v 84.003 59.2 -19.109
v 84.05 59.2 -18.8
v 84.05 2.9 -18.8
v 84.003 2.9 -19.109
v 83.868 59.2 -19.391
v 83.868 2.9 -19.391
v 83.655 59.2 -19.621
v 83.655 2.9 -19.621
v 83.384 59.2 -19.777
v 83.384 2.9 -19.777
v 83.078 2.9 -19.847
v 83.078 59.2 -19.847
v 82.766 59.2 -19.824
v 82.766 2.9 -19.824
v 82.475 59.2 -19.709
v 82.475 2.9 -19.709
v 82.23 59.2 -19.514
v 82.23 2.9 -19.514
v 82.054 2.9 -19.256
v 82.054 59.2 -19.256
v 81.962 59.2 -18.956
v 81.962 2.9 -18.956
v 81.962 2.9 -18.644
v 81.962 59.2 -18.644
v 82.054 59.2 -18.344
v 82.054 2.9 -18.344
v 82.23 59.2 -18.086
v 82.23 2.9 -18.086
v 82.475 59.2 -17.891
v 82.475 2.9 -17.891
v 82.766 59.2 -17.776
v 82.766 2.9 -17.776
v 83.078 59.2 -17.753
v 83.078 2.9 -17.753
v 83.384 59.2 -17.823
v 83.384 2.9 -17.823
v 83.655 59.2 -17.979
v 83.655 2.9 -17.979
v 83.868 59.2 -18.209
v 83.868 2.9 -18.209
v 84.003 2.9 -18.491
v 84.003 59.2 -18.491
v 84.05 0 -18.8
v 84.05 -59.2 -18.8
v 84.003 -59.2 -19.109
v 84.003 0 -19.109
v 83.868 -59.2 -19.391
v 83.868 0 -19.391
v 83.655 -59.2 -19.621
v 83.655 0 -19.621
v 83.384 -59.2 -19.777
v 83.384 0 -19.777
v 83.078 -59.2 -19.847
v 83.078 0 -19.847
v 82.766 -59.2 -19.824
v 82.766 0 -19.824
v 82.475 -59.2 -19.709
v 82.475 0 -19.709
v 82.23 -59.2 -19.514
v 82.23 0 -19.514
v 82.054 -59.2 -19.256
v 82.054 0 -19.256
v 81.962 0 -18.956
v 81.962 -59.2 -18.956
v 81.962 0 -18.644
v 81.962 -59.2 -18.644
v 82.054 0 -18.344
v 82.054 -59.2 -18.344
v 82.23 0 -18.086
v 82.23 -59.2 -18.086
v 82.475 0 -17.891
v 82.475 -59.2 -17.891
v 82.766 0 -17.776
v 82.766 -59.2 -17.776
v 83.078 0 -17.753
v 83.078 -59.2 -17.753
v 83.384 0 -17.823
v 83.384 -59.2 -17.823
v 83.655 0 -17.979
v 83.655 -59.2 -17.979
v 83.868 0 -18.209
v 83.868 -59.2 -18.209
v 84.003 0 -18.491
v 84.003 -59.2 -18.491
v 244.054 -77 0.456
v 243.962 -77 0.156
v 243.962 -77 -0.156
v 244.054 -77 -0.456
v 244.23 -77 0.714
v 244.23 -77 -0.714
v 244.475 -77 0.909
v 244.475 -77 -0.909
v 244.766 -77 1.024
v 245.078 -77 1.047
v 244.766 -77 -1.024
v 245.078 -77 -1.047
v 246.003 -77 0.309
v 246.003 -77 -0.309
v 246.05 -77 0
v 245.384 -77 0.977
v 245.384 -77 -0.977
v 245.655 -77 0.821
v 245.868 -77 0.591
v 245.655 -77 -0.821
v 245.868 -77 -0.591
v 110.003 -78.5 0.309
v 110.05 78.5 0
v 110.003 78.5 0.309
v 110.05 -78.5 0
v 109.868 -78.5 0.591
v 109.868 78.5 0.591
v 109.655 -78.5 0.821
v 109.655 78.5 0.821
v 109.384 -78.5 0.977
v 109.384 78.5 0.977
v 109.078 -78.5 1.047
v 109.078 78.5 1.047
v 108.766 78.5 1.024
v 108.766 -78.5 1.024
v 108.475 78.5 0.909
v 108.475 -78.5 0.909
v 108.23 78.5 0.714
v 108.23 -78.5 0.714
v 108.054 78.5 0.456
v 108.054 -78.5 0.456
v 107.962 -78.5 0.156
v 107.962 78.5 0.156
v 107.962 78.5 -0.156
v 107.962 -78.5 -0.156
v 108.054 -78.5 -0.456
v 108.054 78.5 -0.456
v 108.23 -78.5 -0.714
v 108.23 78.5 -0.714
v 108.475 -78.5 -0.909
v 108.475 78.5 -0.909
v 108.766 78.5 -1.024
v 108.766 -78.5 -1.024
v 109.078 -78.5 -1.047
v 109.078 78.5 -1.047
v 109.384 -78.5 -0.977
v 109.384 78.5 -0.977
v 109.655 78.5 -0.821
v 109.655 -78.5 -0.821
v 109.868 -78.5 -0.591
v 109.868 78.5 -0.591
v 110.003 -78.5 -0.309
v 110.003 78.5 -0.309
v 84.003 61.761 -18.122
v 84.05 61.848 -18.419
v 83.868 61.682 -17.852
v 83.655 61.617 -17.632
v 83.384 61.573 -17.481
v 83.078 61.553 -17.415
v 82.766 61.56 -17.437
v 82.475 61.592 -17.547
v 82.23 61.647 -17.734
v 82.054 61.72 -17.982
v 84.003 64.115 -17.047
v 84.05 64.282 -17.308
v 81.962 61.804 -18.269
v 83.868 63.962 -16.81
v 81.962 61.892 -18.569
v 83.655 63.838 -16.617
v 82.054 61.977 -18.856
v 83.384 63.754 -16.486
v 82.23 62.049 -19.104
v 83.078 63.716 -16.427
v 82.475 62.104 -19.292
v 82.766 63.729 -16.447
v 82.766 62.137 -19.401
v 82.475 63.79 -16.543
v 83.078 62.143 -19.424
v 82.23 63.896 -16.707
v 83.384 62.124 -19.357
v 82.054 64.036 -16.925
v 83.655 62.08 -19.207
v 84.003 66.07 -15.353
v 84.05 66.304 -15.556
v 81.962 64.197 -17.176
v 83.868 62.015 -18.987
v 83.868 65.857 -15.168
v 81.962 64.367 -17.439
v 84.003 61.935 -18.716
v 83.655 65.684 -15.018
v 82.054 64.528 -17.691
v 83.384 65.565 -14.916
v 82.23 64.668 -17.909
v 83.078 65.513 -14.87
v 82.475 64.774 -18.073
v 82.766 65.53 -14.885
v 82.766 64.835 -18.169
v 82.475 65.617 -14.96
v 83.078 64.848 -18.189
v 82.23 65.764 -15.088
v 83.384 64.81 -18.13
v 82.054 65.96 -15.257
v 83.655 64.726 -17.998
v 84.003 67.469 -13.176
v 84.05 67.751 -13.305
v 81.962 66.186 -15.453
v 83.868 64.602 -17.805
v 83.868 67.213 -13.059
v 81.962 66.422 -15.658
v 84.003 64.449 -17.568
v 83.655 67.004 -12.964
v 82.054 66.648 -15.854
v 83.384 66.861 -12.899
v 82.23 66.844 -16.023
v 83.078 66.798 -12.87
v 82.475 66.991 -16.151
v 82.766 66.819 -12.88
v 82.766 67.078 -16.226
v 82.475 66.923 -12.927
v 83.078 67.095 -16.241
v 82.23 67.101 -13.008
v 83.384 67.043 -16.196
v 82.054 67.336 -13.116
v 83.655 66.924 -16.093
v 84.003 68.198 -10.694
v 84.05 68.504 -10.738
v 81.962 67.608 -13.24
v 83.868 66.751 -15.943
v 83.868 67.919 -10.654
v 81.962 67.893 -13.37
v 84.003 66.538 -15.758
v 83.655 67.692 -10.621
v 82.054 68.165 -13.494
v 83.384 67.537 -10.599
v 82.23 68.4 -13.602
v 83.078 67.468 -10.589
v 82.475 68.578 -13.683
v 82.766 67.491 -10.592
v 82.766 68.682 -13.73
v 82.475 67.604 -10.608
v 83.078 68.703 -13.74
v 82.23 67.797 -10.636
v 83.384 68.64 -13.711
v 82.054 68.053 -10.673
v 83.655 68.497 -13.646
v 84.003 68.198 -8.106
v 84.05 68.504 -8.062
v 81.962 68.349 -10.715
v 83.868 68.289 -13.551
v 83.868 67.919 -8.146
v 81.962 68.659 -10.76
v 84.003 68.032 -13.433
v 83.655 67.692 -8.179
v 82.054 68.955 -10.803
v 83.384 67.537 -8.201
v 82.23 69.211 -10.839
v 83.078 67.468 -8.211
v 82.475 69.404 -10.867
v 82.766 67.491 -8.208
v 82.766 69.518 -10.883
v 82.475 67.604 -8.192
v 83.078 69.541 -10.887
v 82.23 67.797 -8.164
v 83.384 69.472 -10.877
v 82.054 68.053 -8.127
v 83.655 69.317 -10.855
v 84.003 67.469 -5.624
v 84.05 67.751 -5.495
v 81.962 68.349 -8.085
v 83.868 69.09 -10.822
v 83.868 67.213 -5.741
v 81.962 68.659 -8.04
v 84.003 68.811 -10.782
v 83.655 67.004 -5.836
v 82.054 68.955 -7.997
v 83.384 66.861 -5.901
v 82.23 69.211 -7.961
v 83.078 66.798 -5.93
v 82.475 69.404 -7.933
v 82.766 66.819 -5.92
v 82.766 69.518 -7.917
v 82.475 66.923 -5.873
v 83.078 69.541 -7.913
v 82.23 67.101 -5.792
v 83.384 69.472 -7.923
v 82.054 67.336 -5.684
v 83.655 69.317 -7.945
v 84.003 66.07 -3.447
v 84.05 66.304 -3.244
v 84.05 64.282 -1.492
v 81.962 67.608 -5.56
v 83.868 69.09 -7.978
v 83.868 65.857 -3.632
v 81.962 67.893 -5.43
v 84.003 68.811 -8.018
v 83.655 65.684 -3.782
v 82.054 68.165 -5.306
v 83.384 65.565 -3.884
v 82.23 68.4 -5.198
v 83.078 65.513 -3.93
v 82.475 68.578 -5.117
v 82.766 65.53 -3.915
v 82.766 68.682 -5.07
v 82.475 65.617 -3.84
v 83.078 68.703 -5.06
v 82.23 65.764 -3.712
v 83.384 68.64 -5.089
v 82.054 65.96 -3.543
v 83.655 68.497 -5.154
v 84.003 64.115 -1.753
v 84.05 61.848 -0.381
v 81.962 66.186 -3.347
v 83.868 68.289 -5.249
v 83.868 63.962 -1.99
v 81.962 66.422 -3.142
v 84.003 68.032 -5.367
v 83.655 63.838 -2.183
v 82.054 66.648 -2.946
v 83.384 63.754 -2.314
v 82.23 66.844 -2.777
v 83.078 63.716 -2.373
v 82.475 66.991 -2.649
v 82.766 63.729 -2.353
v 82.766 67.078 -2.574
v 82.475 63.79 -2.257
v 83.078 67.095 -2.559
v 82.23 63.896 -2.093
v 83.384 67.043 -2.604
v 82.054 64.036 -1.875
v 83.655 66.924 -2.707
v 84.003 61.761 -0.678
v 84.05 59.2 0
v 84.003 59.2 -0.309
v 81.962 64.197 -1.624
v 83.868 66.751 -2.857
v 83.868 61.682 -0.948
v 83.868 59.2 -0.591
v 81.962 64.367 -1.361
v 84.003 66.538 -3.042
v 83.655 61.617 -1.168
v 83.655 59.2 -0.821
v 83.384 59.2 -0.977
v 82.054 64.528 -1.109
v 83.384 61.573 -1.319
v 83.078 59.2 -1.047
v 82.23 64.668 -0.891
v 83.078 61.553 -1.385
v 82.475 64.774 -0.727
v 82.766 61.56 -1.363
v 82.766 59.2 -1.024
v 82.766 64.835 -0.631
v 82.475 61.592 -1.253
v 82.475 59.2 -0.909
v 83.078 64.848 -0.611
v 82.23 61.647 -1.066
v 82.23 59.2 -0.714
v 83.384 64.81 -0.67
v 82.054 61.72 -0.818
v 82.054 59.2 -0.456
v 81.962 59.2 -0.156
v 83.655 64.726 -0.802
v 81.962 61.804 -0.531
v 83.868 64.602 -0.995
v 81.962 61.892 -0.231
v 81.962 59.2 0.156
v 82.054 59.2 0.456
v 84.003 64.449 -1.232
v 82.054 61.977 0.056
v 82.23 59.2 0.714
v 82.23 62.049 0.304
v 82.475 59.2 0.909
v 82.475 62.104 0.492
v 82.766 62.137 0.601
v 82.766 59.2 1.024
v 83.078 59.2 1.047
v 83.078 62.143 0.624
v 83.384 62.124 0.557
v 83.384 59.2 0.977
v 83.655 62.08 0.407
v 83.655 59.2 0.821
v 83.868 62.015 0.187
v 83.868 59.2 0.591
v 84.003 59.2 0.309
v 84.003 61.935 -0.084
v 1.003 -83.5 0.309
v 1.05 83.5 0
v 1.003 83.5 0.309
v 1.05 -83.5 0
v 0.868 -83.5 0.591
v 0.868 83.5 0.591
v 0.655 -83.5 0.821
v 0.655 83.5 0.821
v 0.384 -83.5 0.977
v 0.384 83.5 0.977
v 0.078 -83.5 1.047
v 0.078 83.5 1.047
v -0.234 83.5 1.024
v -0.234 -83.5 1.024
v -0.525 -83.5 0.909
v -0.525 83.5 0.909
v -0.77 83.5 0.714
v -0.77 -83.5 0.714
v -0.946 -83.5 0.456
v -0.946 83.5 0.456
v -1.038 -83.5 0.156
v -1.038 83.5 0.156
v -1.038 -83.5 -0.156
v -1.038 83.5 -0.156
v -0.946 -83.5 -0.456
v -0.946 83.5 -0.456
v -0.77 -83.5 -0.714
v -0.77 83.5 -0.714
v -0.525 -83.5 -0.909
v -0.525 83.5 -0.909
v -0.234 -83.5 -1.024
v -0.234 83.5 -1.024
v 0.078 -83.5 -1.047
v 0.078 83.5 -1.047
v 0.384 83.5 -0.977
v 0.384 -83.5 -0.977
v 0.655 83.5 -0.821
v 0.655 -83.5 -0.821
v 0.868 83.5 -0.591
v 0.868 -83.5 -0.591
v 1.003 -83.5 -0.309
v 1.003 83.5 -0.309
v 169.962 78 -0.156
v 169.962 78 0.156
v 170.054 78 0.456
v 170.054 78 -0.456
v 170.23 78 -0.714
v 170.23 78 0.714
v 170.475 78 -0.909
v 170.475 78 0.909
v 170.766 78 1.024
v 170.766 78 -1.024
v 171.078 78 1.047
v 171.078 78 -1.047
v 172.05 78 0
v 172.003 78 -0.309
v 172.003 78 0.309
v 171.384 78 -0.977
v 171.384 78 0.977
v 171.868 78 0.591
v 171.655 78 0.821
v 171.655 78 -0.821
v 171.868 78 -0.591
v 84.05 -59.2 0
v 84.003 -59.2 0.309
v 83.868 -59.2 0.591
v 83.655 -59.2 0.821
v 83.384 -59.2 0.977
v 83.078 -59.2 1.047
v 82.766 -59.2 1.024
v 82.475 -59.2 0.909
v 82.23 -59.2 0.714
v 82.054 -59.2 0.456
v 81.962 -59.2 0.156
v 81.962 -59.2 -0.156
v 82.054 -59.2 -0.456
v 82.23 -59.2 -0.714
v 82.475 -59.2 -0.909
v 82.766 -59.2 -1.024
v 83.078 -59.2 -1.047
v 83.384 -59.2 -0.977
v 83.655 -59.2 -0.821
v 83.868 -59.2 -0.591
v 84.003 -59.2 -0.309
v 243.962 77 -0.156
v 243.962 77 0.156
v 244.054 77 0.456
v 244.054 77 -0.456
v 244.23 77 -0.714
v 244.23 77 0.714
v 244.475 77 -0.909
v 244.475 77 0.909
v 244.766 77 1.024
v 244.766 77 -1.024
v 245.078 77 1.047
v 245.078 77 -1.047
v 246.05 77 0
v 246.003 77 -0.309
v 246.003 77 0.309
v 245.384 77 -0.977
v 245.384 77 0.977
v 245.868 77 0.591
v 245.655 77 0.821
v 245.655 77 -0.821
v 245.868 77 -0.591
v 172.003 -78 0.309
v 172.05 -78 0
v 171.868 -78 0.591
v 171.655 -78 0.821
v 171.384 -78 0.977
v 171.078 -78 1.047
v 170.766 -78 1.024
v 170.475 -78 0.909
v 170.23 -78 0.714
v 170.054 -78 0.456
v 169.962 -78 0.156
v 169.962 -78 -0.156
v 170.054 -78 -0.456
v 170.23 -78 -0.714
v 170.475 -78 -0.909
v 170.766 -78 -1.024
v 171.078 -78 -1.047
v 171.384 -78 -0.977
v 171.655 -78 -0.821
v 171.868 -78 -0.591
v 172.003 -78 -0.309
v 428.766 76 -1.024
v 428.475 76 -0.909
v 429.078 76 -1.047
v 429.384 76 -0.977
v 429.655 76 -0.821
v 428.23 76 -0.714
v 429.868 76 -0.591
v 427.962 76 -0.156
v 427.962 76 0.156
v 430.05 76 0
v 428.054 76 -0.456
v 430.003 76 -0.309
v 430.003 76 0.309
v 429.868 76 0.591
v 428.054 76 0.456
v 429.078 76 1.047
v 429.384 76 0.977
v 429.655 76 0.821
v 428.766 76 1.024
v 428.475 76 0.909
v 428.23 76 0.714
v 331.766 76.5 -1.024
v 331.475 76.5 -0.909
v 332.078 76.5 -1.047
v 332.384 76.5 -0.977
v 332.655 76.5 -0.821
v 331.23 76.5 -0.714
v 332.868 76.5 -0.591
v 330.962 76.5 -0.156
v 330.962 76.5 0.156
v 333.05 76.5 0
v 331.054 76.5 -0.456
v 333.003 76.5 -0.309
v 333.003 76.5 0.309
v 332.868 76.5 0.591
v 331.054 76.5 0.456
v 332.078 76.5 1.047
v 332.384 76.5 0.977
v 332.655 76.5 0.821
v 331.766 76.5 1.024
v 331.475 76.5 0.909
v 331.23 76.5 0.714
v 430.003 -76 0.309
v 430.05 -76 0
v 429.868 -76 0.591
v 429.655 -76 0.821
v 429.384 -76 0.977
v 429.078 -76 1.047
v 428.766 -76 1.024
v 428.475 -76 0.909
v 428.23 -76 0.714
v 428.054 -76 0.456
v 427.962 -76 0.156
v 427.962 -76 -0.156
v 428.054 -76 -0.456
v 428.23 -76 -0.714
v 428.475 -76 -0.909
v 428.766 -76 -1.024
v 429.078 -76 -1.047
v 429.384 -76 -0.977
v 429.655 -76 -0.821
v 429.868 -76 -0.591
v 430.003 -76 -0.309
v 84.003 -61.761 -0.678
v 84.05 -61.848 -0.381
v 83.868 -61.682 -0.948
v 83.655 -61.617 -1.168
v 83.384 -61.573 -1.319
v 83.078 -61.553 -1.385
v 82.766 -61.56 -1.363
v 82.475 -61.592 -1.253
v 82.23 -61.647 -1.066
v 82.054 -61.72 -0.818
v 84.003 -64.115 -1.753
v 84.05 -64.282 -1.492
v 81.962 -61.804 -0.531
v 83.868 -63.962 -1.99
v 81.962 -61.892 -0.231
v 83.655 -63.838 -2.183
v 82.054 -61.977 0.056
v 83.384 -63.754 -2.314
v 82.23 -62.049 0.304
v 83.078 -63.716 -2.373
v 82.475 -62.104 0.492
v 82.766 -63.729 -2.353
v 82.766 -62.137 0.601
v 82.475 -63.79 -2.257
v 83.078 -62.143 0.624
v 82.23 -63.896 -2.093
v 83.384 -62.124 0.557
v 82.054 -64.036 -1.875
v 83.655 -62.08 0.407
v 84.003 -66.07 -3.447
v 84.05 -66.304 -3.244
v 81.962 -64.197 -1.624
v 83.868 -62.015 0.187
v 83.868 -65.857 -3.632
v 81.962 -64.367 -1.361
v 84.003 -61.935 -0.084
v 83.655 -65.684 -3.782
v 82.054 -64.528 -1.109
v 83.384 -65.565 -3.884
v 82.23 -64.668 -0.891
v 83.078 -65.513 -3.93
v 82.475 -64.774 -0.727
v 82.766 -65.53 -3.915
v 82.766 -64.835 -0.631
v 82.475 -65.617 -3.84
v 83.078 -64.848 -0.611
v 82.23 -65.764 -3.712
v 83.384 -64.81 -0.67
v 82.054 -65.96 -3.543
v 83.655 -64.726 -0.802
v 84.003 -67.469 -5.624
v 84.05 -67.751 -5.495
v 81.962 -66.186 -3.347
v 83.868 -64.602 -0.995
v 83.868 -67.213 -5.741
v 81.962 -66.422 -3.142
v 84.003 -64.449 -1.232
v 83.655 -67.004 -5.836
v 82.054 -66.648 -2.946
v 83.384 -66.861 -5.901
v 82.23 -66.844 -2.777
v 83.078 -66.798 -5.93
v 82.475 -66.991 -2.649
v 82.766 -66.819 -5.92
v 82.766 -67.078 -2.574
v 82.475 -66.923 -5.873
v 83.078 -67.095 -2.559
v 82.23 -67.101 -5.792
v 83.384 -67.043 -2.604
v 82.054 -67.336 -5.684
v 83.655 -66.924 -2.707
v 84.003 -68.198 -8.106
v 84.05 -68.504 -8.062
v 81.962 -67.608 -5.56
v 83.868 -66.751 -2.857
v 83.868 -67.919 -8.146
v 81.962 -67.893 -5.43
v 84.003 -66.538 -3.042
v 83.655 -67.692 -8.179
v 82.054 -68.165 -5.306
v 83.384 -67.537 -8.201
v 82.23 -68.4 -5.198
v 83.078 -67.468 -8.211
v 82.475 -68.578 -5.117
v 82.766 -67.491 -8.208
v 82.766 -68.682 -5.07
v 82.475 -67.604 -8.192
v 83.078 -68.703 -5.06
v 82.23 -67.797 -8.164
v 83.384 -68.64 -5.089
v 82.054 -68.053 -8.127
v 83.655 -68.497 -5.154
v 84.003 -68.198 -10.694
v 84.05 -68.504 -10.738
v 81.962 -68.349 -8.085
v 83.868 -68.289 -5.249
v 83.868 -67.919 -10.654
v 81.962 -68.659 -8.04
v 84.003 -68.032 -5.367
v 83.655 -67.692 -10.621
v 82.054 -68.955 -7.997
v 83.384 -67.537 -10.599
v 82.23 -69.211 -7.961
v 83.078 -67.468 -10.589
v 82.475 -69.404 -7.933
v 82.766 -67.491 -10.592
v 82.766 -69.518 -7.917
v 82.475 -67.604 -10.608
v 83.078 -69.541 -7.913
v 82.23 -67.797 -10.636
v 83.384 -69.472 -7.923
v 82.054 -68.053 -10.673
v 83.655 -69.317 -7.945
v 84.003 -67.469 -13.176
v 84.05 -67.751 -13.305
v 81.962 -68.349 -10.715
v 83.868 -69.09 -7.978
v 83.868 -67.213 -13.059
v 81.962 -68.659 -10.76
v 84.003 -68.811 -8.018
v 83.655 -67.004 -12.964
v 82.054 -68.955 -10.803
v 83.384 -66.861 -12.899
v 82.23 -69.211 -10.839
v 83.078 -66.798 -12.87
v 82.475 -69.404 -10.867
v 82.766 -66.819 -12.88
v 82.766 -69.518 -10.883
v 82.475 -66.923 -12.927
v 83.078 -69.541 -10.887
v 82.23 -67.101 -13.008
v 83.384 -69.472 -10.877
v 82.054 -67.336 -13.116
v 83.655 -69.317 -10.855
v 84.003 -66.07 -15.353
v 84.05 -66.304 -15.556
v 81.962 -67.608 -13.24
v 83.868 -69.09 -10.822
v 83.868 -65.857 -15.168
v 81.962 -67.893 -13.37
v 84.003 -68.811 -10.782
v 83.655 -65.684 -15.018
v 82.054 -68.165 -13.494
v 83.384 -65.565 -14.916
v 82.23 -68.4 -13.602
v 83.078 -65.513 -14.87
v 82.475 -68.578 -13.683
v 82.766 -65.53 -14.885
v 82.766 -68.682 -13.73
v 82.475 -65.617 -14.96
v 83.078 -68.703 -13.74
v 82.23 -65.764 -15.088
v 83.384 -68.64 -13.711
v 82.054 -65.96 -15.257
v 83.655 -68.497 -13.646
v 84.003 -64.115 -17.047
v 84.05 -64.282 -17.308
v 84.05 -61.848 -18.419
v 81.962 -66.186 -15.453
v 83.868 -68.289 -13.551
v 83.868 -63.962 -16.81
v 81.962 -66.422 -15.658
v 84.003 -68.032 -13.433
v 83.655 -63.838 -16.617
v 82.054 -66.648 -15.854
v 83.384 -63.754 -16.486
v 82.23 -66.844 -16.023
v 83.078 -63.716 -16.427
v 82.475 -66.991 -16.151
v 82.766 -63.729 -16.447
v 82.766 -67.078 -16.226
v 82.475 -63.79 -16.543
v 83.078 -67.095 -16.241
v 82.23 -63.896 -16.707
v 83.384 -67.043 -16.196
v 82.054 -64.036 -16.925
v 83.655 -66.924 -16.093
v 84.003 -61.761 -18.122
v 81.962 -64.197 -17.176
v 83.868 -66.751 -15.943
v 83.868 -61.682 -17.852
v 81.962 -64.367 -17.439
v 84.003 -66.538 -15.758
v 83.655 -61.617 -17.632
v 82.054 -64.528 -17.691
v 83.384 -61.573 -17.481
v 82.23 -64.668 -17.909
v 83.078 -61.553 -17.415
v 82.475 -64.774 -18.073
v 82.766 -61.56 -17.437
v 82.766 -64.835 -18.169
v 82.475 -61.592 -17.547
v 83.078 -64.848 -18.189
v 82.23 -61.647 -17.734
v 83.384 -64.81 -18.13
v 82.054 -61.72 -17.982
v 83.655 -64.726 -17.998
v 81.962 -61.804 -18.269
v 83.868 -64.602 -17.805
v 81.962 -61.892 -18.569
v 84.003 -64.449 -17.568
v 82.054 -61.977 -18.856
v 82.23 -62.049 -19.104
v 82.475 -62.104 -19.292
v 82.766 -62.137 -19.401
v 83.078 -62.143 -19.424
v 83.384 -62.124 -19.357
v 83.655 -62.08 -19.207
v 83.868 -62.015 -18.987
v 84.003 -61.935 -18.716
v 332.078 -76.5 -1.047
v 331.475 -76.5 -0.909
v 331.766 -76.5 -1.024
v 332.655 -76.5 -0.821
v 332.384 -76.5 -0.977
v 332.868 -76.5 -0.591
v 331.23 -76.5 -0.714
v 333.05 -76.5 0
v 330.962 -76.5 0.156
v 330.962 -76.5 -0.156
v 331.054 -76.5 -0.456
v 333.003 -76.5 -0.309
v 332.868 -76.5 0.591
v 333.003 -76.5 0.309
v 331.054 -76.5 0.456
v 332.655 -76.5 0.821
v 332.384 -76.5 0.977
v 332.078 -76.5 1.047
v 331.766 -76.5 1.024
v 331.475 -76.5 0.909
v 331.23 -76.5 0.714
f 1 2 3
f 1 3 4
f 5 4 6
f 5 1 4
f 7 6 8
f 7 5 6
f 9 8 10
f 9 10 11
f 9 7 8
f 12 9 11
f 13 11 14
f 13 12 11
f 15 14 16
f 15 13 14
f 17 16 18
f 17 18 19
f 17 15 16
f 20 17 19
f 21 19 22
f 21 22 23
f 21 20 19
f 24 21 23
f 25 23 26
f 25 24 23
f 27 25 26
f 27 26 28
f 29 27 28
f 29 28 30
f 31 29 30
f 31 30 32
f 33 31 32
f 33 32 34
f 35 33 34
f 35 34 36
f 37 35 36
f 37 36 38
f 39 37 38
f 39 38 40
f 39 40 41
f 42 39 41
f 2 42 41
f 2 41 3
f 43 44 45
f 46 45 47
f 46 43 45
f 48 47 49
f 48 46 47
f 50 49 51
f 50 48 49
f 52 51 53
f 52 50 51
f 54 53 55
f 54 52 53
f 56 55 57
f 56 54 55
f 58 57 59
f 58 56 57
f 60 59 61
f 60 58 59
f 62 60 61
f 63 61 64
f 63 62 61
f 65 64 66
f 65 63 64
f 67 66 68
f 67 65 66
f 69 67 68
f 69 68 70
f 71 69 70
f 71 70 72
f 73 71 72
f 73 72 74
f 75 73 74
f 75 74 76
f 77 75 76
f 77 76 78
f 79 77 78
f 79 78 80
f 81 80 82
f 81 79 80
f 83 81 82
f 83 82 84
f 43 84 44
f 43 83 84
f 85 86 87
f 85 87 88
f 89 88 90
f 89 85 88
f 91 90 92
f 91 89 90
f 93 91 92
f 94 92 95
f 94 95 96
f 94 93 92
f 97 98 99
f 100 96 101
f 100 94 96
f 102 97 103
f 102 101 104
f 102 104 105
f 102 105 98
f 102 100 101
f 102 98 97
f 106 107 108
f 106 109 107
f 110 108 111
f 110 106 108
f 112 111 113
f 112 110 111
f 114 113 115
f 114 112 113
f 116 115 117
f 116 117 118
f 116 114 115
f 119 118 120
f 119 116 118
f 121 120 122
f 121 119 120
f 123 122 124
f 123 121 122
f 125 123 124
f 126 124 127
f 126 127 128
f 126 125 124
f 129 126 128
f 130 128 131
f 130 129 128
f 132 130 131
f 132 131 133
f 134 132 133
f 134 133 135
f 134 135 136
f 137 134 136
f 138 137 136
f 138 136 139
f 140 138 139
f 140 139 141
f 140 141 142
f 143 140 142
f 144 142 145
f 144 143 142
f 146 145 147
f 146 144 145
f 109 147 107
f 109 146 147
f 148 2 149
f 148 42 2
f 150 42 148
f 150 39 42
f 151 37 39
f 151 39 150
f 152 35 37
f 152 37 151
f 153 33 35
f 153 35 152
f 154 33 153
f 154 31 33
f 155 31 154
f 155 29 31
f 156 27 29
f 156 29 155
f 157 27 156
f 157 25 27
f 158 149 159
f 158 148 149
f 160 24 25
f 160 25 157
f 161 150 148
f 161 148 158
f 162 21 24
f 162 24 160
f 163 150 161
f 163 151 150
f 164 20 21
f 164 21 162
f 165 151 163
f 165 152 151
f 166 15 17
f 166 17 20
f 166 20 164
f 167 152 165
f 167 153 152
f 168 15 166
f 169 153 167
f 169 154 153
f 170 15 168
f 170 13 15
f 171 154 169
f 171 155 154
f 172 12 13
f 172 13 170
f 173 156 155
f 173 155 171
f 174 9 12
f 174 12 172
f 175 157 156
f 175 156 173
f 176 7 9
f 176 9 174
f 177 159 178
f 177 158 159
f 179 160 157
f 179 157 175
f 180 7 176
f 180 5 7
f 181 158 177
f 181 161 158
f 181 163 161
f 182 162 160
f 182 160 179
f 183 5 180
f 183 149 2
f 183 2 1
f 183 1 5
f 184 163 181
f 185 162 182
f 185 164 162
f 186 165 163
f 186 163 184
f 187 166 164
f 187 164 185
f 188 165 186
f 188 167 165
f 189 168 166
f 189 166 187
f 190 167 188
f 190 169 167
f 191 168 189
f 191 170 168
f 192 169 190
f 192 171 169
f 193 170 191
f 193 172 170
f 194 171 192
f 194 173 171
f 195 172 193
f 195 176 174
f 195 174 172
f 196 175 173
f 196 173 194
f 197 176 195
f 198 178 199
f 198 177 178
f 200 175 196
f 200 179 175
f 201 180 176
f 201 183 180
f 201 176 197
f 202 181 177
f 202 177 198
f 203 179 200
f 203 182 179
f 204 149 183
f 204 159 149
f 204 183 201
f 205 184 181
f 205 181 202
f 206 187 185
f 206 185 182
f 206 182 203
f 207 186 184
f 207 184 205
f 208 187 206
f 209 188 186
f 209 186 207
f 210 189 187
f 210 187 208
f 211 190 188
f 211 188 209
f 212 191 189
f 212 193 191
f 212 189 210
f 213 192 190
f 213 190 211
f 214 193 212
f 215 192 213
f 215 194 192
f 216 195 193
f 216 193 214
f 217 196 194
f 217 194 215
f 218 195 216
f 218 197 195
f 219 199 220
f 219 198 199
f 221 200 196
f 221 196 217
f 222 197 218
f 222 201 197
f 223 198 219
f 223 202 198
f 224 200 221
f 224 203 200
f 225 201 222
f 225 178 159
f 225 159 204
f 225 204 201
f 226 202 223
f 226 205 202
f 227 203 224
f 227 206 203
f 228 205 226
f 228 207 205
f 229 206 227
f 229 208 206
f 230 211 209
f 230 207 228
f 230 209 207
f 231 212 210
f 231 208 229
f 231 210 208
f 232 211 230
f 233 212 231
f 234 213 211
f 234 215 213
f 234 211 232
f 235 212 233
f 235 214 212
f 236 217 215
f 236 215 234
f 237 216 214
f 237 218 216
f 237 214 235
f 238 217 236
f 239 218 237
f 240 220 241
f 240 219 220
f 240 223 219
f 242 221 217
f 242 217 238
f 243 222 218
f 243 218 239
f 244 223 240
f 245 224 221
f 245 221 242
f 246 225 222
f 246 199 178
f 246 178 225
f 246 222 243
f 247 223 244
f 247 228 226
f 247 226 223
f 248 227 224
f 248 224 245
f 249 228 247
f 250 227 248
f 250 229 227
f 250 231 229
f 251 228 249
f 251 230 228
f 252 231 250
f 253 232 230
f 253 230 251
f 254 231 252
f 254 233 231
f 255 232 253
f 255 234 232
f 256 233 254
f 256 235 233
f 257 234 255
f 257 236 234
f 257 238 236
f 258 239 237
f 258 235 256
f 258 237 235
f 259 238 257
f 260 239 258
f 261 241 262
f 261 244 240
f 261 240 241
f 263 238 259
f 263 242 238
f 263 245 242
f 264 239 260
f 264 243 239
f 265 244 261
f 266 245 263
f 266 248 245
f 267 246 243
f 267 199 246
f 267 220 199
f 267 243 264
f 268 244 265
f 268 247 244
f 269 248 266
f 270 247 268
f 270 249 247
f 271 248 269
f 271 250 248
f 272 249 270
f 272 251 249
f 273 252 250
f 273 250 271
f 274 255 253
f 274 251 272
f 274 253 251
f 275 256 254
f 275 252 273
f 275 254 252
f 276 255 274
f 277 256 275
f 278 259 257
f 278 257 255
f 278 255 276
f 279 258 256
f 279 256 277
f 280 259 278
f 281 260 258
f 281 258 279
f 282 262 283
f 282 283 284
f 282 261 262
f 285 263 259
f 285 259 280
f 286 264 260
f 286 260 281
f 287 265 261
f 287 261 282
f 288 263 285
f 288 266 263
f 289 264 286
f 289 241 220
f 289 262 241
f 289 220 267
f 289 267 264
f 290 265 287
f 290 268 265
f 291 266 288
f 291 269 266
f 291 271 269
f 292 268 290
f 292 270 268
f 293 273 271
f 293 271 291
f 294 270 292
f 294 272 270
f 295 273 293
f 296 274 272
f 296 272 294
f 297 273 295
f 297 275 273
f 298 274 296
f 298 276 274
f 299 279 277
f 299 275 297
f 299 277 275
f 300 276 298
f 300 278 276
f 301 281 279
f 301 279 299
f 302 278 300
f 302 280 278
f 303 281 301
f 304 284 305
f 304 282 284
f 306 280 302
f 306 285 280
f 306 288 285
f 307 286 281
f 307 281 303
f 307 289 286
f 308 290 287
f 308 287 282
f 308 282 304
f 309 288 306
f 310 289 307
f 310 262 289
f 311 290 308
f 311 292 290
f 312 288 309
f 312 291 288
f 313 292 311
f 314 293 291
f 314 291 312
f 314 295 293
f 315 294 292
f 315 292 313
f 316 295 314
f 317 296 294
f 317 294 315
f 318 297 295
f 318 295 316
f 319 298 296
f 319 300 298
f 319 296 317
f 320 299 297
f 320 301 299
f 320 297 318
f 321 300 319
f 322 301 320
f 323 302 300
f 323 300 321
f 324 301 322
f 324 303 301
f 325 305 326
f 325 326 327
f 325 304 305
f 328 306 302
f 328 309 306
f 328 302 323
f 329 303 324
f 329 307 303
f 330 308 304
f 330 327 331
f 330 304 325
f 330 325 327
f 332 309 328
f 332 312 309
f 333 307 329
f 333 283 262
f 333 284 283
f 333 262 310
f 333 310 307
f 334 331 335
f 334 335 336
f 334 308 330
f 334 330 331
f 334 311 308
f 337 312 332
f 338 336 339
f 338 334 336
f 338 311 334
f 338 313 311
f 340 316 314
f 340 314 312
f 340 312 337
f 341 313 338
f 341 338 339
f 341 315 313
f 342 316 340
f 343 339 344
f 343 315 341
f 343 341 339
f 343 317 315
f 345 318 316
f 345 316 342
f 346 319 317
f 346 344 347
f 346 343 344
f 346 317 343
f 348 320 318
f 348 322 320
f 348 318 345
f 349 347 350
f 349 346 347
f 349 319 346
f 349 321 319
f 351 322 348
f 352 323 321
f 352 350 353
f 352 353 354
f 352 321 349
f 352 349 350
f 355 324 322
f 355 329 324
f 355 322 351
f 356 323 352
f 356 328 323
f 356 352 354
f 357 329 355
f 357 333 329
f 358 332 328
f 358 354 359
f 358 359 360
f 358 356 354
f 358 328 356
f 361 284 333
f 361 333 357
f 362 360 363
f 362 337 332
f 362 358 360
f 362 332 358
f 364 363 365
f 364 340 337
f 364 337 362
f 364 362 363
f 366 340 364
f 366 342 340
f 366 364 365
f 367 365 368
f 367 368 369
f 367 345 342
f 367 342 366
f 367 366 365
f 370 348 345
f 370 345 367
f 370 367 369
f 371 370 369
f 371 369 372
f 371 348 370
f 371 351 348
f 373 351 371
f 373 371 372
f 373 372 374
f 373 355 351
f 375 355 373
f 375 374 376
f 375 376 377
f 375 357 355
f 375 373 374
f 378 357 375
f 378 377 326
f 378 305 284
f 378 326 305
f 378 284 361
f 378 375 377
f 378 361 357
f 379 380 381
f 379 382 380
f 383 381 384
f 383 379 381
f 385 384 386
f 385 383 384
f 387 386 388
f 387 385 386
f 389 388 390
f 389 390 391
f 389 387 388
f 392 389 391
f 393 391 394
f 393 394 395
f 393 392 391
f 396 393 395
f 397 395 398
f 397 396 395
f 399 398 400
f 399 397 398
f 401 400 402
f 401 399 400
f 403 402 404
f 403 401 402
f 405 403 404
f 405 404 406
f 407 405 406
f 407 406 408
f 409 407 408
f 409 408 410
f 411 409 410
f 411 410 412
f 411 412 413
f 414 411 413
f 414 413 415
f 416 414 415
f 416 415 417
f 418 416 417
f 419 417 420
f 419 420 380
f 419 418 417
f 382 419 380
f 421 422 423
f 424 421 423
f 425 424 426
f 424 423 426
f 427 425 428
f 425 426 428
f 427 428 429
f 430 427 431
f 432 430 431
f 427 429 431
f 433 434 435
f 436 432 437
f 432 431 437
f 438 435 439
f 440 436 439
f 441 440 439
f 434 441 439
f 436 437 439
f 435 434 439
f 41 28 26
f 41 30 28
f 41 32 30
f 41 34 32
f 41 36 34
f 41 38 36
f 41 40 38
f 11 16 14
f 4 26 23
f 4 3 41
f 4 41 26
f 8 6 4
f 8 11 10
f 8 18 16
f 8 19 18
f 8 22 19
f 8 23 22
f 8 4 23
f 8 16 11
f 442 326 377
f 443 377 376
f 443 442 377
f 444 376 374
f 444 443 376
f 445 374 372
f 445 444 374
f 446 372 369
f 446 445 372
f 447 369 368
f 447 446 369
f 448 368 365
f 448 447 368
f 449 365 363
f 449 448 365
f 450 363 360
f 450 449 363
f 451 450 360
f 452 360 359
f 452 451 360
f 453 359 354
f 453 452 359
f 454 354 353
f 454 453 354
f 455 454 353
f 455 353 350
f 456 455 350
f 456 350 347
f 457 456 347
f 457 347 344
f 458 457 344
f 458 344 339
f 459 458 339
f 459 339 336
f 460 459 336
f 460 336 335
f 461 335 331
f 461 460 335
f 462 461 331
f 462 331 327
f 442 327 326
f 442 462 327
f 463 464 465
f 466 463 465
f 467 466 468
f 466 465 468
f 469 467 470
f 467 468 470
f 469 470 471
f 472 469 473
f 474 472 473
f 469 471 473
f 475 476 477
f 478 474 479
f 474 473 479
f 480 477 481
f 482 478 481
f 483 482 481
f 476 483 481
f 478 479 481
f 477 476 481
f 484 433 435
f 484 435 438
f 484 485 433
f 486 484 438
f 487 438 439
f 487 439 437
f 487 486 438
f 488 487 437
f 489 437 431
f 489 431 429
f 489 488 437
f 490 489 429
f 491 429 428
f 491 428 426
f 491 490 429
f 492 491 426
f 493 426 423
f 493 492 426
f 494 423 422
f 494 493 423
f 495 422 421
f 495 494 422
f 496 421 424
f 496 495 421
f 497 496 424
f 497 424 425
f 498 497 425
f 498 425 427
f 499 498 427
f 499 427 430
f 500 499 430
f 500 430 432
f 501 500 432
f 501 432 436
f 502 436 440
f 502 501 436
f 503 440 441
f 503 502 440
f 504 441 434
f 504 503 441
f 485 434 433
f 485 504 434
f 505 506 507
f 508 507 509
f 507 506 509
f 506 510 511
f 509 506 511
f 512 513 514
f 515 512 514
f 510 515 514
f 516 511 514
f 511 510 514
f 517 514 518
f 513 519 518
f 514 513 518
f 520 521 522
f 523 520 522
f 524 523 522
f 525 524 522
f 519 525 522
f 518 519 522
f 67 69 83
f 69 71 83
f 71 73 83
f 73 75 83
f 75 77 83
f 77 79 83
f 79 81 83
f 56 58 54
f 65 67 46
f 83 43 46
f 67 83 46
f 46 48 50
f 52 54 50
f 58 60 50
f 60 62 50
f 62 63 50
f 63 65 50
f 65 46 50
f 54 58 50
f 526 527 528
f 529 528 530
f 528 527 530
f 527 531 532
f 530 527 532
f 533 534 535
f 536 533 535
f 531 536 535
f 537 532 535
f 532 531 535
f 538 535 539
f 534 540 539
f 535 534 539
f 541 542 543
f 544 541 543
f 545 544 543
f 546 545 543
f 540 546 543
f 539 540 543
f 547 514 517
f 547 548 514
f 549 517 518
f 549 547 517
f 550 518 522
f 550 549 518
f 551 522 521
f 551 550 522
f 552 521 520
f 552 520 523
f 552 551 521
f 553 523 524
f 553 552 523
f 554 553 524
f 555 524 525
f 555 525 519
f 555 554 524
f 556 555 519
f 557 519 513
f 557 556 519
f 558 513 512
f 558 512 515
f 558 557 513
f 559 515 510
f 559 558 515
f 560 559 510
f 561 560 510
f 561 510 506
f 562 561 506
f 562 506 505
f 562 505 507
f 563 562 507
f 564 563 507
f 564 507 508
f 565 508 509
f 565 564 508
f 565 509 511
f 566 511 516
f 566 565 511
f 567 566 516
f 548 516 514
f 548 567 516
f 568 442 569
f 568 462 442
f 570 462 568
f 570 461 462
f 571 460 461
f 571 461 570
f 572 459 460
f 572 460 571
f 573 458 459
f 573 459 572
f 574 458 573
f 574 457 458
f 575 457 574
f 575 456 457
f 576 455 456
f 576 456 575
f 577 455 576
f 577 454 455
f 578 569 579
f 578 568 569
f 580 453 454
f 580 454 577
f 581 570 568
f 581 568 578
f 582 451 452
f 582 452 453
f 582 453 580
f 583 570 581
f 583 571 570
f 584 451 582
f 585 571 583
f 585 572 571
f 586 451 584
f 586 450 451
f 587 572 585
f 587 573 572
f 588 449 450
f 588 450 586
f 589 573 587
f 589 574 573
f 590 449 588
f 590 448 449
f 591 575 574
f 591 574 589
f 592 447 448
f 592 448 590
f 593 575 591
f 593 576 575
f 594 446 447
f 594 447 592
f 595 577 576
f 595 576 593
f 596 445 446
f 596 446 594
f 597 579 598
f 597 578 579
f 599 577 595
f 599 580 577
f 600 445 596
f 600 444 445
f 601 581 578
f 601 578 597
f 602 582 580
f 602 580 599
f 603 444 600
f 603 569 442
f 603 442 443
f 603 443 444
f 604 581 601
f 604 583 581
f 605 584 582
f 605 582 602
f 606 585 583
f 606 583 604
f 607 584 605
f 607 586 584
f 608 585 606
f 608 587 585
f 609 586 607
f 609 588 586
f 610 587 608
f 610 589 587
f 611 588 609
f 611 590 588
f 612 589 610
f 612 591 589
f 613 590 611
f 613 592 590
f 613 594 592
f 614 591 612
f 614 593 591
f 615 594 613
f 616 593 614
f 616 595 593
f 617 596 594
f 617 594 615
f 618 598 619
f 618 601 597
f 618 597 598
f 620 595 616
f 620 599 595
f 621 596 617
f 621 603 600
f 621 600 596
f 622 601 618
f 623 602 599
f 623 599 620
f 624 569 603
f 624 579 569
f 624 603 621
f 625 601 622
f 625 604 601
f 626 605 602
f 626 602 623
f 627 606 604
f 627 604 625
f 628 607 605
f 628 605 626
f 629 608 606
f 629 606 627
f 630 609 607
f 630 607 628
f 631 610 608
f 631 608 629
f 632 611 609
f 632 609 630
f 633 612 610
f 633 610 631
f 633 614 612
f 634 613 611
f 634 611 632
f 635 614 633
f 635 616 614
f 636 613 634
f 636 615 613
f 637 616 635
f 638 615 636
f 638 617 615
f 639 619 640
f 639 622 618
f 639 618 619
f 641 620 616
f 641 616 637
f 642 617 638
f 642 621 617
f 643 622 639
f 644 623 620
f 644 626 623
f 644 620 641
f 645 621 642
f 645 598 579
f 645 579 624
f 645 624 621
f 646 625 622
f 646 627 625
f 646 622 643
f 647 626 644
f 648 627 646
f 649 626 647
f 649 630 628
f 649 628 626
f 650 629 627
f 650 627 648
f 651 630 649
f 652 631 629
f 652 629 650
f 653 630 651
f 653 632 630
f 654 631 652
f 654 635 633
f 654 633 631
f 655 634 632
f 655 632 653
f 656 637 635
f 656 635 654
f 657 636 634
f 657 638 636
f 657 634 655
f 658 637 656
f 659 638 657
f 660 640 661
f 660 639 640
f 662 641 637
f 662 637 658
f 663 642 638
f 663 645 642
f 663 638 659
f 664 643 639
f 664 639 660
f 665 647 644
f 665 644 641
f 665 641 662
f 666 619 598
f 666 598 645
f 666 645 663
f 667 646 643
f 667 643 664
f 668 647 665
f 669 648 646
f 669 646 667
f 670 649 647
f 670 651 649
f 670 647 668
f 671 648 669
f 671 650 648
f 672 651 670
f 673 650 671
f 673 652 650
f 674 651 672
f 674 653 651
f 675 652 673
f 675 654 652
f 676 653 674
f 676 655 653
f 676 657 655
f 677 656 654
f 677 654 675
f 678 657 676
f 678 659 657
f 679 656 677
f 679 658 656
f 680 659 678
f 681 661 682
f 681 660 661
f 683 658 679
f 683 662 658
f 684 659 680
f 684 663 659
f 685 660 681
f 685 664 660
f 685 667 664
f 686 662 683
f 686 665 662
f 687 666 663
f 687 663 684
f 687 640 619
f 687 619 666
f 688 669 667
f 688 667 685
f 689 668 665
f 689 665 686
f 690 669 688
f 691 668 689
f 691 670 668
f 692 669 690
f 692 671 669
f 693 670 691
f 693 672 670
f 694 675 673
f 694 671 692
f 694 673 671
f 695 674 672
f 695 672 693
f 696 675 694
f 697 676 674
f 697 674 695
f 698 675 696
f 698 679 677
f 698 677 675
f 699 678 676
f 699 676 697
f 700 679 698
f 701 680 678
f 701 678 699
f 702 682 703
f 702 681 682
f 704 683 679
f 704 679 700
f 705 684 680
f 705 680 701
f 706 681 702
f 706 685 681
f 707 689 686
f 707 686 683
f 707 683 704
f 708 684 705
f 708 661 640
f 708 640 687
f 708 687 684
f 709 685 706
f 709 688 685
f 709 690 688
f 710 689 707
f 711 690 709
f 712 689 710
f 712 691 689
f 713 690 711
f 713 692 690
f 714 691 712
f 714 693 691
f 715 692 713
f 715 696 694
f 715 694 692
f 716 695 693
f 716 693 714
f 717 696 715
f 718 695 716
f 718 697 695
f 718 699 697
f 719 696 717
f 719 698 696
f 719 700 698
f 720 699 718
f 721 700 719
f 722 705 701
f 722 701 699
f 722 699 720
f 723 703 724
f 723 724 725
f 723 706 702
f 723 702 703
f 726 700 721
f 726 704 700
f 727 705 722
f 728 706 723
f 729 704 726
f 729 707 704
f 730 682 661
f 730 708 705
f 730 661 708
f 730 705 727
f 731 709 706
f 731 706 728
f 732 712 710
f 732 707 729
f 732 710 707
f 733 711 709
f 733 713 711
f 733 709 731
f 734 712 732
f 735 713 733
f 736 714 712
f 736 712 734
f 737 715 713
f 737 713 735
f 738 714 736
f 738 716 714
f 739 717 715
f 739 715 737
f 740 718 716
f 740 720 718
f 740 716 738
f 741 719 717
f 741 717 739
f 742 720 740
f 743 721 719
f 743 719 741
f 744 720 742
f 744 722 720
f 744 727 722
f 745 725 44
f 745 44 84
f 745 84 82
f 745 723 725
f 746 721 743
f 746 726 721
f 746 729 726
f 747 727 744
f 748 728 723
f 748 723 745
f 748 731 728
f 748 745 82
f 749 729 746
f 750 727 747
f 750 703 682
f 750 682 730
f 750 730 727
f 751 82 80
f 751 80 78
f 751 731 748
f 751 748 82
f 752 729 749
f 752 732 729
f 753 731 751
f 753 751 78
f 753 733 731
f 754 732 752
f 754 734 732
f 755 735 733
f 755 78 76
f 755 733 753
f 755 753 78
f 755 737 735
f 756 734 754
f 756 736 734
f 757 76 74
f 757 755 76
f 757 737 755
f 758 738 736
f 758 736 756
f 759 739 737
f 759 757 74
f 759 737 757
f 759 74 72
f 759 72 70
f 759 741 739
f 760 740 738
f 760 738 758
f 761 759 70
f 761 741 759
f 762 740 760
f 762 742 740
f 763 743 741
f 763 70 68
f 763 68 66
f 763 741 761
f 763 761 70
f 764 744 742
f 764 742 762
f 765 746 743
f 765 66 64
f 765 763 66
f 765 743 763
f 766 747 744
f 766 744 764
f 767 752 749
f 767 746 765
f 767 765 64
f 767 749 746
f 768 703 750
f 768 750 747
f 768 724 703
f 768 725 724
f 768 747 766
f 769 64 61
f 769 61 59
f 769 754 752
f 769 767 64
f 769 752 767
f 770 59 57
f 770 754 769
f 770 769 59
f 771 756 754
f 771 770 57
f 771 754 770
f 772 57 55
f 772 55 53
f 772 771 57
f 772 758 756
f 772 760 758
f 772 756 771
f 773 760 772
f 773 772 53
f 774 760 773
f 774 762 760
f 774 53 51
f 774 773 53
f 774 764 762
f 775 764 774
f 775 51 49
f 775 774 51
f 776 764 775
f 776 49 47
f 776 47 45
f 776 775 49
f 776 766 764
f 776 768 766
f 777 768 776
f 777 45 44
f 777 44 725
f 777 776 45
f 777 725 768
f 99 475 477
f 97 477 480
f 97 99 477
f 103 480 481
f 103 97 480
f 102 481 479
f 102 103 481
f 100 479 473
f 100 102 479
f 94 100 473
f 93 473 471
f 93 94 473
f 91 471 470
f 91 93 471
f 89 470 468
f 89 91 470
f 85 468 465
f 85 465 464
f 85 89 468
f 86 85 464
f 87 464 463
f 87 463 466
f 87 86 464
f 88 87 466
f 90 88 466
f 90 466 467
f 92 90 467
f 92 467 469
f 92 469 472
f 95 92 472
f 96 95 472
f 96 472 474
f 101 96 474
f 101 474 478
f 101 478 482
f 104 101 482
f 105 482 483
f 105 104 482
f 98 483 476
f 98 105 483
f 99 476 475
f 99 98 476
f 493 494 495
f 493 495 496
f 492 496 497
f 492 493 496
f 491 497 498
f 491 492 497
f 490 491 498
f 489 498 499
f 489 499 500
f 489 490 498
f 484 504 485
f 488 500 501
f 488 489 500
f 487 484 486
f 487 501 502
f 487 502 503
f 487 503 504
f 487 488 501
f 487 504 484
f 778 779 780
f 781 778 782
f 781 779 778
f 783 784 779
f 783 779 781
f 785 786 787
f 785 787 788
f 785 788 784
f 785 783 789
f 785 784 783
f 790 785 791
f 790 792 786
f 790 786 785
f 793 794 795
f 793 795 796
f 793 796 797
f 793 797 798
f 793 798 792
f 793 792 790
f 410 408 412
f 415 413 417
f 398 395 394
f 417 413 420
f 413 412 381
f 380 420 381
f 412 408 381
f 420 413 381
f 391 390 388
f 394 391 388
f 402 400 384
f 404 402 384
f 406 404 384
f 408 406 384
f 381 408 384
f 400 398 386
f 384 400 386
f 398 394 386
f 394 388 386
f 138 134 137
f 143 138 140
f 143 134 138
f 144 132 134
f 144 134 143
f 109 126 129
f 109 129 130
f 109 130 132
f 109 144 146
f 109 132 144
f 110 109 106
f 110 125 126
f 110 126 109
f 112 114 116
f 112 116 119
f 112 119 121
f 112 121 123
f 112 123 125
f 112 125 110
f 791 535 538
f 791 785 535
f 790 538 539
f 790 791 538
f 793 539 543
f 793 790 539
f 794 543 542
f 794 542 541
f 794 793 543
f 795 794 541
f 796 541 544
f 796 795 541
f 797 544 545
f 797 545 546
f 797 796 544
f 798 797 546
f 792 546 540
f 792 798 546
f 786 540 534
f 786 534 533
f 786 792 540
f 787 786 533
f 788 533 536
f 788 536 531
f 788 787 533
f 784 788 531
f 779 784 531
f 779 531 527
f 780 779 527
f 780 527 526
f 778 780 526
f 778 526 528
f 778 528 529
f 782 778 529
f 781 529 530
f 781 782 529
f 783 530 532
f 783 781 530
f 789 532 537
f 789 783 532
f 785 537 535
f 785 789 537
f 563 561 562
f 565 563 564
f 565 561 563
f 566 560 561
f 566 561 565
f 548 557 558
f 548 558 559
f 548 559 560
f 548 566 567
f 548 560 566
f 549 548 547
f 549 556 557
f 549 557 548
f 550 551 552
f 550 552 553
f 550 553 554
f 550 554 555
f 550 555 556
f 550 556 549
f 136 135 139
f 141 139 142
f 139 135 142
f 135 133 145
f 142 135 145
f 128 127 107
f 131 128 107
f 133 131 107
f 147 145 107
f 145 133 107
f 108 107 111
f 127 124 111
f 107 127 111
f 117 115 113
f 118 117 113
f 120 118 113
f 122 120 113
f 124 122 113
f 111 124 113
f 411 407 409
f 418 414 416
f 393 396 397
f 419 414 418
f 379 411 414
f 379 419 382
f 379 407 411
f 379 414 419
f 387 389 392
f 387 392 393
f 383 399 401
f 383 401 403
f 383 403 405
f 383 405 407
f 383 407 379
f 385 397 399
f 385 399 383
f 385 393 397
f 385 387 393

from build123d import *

# Parameters (mm, degrees)
SKETCH_R     = 1.05
PAD_DEPTH    = 83.5
SKETCH001_R  = 1.05
PAD001_DEPTH = 78.5
SKETCH002_R  = 1.05
PAD002_DEPTH = 78
SKETCH003_R  = 1.05
PAD003_DEPTH = 77
SKETCH004_R  = 1.05
PAD004_DEPTH = 76.5
SKETCH005_R  = 1.05
PAD005_DEPTH = 76
SKETCH007_R  = 1.05


with BuildPart() as reflector:
    # Sketch → Pad (new body, symmetric)
    with BuildSketch(Plane.XZ):
        Circle(SKETCH_R)
    extrude(amount=PAD_DEPTH, both=True)


with BuildPart() as primer_director:
    # Sketch001 → Pad001 (new body, symmetric)
    with BuildSketch(Plane.XZ):
        with Locations((109, 0)):
            Circle(SKETCH001_R)
    extrude(amount=PAD001_DEPTH, both=True)


with BuildPart() as segundo_director:
    # Sketch002 → Pad002 (new body, symmetric)
    with BuildSketch(Plane.XZ):
        with Locations((171, 0)):
            Circle(SKETCH002_R)
    extrude(amount=PAD002_DEPTH, both=True)


with BuildPart() as tercer_director:
    # Sketch003 → Pad003 (new body, symmetric)
    with BuildSketch(Plane.XZ):
        with Locations((245, 0)):
            Circle(SKETCH003_R)
    extrude(amount=PAD003_DEPTH, both=True)


with BuildPart() as cuarto_director:
    # Sketch004 → Pad004 (new body, symmetric)
    with BuildSketch(Plane.XZ):
        with Locations((332, 0)):
            Circle(SKETCH004_R)
    extrude(amount=PAD004_DEPTH, both=True)


with BuildPart() as quinto_director:
    # Sketch005 → Pad005 (new body, symmetric)
    with BuildSketch(Plane.XZ):
        with Locations((429, 0)):
            Circle(SKETCH005_R)
    extrude(amount=PAD005_DEPTH, both=True)


with BuildPart() as dipolo_cuerpo:
    # AdditivePipe: sweep along a path in Sketch006
    with BuildLine(Plane.YZ.offset(83)) as additivepipe_path:
        Line((2.9, -18.8), (59.2, -18.8))
        ThreePointArc((59.2, -18.8), (68.6, -9.4), (59.2, 0))
        Line((59.2, 0), (-59.2, 0))
        ThreePointArc((-59.2, 0), (-68.6, -9.4), (-59.2, -18.8))
        Line((-59.2, -18.8), (0, -18.8))
    # Sketch007 → AdditivePipe (sweep)
    with BuildSketch(Plane(origin=(15.745148, 2.9, -20.31305), x_dir=(1, 0, 0), z_dir=(0, -1, 0))):
        with Locations((67.254852, 1.51305)):
            Circle(SKETCH007_R)
    sweep(path=additivepipe_path.line)


solid = Compound([reflector.part, primer_director.part, segundo_director.part, tercer_director.part, cuarto_director.part, quinto_director.part, dipolo_cuerpo.part])
